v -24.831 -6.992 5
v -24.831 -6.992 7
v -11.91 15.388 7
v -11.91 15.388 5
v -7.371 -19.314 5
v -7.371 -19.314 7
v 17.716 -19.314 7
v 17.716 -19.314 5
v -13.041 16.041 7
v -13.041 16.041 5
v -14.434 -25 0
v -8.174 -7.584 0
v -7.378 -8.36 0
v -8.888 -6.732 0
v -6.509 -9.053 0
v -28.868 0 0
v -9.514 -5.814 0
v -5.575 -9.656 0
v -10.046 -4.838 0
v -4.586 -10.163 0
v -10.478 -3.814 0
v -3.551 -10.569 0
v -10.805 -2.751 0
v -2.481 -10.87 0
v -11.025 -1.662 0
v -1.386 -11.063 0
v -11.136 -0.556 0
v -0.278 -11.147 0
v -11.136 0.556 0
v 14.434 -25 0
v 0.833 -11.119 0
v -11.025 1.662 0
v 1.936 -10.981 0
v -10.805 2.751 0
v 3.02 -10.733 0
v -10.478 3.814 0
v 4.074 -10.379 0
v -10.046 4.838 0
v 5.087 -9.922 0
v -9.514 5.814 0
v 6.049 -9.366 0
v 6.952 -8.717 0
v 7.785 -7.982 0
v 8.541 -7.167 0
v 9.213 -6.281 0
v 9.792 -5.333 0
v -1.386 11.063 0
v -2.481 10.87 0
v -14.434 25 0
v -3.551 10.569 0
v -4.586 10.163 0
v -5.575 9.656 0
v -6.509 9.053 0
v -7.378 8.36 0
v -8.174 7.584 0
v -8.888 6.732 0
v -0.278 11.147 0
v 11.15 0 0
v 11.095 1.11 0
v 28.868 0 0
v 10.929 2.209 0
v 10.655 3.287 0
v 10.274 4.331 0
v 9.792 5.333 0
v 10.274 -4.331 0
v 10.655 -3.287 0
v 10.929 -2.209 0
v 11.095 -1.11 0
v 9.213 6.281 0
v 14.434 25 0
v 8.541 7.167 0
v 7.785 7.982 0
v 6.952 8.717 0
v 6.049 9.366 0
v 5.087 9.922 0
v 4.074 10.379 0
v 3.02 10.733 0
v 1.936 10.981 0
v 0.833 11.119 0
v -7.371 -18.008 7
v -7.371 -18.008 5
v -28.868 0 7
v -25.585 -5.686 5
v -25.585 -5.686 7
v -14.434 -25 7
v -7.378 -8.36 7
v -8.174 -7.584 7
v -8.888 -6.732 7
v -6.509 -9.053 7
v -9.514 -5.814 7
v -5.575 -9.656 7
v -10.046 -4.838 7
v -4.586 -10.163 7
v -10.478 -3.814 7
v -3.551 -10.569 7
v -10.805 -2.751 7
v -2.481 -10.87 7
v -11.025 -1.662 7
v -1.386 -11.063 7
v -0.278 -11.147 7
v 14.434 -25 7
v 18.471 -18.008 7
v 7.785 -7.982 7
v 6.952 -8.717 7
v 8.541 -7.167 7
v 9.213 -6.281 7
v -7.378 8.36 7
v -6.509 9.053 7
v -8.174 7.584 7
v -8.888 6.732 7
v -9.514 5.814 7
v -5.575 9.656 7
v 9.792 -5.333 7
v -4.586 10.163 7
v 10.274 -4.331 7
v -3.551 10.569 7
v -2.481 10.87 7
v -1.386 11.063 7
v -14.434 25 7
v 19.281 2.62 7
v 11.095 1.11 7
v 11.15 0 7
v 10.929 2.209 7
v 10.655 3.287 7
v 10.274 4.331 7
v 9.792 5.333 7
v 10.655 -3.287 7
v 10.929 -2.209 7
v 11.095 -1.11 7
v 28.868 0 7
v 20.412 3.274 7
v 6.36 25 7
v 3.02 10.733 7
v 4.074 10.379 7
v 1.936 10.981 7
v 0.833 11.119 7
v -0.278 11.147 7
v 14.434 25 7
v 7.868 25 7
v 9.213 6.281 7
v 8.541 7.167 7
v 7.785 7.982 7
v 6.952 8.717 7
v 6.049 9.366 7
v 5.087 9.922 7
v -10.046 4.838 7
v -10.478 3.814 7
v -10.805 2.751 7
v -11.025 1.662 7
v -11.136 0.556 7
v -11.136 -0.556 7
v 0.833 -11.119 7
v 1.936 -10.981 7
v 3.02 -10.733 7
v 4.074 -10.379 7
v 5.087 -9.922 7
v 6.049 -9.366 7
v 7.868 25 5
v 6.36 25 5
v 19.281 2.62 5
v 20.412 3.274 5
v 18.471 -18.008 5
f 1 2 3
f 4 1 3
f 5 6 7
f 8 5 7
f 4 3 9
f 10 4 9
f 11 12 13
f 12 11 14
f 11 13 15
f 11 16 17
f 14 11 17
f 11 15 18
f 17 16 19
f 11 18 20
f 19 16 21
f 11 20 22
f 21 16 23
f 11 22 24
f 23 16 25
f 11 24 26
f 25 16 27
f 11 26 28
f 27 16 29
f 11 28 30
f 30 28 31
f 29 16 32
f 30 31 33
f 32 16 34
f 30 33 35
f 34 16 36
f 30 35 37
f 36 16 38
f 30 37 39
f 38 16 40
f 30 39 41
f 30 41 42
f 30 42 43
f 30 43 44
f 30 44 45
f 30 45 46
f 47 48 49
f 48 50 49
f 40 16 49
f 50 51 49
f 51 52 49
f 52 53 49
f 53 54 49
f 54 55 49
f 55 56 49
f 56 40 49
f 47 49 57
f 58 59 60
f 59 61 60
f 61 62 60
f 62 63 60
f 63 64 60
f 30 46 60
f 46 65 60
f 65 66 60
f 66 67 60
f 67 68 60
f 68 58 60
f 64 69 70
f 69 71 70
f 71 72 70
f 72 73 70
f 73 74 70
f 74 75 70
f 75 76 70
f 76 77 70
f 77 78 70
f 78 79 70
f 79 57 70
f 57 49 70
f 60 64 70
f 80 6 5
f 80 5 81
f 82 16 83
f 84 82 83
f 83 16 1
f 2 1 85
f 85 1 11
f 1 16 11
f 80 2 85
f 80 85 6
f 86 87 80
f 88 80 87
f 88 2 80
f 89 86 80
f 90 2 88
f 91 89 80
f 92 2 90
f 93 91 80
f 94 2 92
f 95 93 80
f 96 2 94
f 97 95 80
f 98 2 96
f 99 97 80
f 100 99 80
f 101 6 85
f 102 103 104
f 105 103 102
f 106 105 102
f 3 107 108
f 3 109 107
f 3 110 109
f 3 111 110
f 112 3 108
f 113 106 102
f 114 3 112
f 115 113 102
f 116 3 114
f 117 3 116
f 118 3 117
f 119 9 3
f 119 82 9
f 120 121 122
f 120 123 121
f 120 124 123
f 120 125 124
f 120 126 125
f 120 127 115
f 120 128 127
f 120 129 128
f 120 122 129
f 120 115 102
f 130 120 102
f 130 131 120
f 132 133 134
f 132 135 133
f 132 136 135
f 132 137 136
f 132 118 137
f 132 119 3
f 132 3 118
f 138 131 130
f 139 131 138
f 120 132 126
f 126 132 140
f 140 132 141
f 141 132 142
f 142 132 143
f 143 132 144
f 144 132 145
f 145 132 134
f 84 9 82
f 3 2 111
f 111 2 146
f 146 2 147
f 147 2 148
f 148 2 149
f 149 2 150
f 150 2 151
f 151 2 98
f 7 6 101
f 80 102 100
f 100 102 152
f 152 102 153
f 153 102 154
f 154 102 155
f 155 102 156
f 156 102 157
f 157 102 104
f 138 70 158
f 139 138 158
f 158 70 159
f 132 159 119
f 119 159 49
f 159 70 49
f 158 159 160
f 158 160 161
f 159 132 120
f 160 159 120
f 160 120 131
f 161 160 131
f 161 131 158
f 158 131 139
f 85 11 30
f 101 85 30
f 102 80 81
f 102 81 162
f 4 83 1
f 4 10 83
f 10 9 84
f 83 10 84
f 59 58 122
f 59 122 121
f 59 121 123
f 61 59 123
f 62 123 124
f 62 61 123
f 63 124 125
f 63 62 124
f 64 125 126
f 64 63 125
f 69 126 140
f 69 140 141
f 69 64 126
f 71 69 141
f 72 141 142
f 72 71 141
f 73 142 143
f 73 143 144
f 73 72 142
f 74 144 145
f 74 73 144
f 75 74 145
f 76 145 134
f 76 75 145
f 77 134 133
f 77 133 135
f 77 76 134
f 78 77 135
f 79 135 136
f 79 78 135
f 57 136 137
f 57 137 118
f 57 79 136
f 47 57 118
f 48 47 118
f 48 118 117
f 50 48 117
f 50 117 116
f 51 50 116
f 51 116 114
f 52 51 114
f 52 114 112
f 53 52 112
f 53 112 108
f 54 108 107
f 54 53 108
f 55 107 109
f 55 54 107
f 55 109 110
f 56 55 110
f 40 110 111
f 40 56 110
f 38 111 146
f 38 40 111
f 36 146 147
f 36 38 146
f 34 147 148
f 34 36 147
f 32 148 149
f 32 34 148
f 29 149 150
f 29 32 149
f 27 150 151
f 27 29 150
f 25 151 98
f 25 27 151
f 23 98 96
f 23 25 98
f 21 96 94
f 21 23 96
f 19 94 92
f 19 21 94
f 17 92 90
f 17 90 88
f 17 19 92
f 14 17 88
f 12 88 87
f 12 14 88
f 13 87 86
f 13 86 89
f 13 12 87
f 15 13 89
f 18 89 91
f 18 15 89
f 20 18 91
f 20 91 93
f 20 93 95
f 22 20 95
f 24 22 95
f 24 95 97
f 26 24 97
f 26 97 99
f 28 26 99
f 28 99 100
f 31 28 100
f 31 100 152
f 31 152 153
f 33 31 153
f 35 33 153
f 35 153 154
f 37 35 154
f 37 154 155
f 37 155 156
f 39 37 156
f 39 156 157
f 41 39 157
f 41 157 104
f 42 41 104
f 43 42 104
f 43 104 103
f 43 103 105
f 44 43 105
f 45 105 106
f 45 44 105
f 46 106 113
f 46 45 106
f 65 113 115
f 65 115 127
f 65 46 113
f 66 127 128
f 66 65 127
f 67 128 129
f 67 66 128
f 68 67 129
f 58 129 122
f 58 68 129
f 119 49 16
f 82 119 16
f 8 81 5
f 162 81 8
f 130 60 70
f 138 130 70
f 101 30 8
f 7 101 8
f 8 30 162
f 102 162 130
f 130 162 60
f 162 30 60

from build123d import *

# Parameters (mm, degrees)
F0_R     = 11.15
F1_DEPTH = 7
F2_W     = 41.241116
F2_H     = 1.306281
F3_DEPTH = 2


with BuildPart() as f1:
    # F0 (on Top) → F1 (new body)
    with BuildSketch(Plane.XY):
        Polygon((14.433757, 25), (-14.433757, 25), (-28.867513, 0), (-14.433757, -25), (14.433757, -25), (28.867513, 0), align=None)
        Circle(F0_R, mode=Mode.SUBTRACT)
    extrude(amount=F1_DEPTH)

    # F2 (on face) → F3 (cut)
    with BuildSketch(Plane.XY.offset(7)):
        with Locations((13.249409, -18.661137)):
            Rectangle(F2_W, F2_H)
        Polygon((-1.3396, 38.33625), (19.280958, 2.620396), (20.41223, 3.273536), (-0.208328, 38.989391), align=None)
        Polygon((-32.530367, -20.328253), (-11.909808, 15.387601), (-13.041081, 16.040742), (-33.661639, -19.675113), align=None)
    extrude(amount=-F3_DEPTH, mode=Mode.SUBTRACT)


solid = f1.part
